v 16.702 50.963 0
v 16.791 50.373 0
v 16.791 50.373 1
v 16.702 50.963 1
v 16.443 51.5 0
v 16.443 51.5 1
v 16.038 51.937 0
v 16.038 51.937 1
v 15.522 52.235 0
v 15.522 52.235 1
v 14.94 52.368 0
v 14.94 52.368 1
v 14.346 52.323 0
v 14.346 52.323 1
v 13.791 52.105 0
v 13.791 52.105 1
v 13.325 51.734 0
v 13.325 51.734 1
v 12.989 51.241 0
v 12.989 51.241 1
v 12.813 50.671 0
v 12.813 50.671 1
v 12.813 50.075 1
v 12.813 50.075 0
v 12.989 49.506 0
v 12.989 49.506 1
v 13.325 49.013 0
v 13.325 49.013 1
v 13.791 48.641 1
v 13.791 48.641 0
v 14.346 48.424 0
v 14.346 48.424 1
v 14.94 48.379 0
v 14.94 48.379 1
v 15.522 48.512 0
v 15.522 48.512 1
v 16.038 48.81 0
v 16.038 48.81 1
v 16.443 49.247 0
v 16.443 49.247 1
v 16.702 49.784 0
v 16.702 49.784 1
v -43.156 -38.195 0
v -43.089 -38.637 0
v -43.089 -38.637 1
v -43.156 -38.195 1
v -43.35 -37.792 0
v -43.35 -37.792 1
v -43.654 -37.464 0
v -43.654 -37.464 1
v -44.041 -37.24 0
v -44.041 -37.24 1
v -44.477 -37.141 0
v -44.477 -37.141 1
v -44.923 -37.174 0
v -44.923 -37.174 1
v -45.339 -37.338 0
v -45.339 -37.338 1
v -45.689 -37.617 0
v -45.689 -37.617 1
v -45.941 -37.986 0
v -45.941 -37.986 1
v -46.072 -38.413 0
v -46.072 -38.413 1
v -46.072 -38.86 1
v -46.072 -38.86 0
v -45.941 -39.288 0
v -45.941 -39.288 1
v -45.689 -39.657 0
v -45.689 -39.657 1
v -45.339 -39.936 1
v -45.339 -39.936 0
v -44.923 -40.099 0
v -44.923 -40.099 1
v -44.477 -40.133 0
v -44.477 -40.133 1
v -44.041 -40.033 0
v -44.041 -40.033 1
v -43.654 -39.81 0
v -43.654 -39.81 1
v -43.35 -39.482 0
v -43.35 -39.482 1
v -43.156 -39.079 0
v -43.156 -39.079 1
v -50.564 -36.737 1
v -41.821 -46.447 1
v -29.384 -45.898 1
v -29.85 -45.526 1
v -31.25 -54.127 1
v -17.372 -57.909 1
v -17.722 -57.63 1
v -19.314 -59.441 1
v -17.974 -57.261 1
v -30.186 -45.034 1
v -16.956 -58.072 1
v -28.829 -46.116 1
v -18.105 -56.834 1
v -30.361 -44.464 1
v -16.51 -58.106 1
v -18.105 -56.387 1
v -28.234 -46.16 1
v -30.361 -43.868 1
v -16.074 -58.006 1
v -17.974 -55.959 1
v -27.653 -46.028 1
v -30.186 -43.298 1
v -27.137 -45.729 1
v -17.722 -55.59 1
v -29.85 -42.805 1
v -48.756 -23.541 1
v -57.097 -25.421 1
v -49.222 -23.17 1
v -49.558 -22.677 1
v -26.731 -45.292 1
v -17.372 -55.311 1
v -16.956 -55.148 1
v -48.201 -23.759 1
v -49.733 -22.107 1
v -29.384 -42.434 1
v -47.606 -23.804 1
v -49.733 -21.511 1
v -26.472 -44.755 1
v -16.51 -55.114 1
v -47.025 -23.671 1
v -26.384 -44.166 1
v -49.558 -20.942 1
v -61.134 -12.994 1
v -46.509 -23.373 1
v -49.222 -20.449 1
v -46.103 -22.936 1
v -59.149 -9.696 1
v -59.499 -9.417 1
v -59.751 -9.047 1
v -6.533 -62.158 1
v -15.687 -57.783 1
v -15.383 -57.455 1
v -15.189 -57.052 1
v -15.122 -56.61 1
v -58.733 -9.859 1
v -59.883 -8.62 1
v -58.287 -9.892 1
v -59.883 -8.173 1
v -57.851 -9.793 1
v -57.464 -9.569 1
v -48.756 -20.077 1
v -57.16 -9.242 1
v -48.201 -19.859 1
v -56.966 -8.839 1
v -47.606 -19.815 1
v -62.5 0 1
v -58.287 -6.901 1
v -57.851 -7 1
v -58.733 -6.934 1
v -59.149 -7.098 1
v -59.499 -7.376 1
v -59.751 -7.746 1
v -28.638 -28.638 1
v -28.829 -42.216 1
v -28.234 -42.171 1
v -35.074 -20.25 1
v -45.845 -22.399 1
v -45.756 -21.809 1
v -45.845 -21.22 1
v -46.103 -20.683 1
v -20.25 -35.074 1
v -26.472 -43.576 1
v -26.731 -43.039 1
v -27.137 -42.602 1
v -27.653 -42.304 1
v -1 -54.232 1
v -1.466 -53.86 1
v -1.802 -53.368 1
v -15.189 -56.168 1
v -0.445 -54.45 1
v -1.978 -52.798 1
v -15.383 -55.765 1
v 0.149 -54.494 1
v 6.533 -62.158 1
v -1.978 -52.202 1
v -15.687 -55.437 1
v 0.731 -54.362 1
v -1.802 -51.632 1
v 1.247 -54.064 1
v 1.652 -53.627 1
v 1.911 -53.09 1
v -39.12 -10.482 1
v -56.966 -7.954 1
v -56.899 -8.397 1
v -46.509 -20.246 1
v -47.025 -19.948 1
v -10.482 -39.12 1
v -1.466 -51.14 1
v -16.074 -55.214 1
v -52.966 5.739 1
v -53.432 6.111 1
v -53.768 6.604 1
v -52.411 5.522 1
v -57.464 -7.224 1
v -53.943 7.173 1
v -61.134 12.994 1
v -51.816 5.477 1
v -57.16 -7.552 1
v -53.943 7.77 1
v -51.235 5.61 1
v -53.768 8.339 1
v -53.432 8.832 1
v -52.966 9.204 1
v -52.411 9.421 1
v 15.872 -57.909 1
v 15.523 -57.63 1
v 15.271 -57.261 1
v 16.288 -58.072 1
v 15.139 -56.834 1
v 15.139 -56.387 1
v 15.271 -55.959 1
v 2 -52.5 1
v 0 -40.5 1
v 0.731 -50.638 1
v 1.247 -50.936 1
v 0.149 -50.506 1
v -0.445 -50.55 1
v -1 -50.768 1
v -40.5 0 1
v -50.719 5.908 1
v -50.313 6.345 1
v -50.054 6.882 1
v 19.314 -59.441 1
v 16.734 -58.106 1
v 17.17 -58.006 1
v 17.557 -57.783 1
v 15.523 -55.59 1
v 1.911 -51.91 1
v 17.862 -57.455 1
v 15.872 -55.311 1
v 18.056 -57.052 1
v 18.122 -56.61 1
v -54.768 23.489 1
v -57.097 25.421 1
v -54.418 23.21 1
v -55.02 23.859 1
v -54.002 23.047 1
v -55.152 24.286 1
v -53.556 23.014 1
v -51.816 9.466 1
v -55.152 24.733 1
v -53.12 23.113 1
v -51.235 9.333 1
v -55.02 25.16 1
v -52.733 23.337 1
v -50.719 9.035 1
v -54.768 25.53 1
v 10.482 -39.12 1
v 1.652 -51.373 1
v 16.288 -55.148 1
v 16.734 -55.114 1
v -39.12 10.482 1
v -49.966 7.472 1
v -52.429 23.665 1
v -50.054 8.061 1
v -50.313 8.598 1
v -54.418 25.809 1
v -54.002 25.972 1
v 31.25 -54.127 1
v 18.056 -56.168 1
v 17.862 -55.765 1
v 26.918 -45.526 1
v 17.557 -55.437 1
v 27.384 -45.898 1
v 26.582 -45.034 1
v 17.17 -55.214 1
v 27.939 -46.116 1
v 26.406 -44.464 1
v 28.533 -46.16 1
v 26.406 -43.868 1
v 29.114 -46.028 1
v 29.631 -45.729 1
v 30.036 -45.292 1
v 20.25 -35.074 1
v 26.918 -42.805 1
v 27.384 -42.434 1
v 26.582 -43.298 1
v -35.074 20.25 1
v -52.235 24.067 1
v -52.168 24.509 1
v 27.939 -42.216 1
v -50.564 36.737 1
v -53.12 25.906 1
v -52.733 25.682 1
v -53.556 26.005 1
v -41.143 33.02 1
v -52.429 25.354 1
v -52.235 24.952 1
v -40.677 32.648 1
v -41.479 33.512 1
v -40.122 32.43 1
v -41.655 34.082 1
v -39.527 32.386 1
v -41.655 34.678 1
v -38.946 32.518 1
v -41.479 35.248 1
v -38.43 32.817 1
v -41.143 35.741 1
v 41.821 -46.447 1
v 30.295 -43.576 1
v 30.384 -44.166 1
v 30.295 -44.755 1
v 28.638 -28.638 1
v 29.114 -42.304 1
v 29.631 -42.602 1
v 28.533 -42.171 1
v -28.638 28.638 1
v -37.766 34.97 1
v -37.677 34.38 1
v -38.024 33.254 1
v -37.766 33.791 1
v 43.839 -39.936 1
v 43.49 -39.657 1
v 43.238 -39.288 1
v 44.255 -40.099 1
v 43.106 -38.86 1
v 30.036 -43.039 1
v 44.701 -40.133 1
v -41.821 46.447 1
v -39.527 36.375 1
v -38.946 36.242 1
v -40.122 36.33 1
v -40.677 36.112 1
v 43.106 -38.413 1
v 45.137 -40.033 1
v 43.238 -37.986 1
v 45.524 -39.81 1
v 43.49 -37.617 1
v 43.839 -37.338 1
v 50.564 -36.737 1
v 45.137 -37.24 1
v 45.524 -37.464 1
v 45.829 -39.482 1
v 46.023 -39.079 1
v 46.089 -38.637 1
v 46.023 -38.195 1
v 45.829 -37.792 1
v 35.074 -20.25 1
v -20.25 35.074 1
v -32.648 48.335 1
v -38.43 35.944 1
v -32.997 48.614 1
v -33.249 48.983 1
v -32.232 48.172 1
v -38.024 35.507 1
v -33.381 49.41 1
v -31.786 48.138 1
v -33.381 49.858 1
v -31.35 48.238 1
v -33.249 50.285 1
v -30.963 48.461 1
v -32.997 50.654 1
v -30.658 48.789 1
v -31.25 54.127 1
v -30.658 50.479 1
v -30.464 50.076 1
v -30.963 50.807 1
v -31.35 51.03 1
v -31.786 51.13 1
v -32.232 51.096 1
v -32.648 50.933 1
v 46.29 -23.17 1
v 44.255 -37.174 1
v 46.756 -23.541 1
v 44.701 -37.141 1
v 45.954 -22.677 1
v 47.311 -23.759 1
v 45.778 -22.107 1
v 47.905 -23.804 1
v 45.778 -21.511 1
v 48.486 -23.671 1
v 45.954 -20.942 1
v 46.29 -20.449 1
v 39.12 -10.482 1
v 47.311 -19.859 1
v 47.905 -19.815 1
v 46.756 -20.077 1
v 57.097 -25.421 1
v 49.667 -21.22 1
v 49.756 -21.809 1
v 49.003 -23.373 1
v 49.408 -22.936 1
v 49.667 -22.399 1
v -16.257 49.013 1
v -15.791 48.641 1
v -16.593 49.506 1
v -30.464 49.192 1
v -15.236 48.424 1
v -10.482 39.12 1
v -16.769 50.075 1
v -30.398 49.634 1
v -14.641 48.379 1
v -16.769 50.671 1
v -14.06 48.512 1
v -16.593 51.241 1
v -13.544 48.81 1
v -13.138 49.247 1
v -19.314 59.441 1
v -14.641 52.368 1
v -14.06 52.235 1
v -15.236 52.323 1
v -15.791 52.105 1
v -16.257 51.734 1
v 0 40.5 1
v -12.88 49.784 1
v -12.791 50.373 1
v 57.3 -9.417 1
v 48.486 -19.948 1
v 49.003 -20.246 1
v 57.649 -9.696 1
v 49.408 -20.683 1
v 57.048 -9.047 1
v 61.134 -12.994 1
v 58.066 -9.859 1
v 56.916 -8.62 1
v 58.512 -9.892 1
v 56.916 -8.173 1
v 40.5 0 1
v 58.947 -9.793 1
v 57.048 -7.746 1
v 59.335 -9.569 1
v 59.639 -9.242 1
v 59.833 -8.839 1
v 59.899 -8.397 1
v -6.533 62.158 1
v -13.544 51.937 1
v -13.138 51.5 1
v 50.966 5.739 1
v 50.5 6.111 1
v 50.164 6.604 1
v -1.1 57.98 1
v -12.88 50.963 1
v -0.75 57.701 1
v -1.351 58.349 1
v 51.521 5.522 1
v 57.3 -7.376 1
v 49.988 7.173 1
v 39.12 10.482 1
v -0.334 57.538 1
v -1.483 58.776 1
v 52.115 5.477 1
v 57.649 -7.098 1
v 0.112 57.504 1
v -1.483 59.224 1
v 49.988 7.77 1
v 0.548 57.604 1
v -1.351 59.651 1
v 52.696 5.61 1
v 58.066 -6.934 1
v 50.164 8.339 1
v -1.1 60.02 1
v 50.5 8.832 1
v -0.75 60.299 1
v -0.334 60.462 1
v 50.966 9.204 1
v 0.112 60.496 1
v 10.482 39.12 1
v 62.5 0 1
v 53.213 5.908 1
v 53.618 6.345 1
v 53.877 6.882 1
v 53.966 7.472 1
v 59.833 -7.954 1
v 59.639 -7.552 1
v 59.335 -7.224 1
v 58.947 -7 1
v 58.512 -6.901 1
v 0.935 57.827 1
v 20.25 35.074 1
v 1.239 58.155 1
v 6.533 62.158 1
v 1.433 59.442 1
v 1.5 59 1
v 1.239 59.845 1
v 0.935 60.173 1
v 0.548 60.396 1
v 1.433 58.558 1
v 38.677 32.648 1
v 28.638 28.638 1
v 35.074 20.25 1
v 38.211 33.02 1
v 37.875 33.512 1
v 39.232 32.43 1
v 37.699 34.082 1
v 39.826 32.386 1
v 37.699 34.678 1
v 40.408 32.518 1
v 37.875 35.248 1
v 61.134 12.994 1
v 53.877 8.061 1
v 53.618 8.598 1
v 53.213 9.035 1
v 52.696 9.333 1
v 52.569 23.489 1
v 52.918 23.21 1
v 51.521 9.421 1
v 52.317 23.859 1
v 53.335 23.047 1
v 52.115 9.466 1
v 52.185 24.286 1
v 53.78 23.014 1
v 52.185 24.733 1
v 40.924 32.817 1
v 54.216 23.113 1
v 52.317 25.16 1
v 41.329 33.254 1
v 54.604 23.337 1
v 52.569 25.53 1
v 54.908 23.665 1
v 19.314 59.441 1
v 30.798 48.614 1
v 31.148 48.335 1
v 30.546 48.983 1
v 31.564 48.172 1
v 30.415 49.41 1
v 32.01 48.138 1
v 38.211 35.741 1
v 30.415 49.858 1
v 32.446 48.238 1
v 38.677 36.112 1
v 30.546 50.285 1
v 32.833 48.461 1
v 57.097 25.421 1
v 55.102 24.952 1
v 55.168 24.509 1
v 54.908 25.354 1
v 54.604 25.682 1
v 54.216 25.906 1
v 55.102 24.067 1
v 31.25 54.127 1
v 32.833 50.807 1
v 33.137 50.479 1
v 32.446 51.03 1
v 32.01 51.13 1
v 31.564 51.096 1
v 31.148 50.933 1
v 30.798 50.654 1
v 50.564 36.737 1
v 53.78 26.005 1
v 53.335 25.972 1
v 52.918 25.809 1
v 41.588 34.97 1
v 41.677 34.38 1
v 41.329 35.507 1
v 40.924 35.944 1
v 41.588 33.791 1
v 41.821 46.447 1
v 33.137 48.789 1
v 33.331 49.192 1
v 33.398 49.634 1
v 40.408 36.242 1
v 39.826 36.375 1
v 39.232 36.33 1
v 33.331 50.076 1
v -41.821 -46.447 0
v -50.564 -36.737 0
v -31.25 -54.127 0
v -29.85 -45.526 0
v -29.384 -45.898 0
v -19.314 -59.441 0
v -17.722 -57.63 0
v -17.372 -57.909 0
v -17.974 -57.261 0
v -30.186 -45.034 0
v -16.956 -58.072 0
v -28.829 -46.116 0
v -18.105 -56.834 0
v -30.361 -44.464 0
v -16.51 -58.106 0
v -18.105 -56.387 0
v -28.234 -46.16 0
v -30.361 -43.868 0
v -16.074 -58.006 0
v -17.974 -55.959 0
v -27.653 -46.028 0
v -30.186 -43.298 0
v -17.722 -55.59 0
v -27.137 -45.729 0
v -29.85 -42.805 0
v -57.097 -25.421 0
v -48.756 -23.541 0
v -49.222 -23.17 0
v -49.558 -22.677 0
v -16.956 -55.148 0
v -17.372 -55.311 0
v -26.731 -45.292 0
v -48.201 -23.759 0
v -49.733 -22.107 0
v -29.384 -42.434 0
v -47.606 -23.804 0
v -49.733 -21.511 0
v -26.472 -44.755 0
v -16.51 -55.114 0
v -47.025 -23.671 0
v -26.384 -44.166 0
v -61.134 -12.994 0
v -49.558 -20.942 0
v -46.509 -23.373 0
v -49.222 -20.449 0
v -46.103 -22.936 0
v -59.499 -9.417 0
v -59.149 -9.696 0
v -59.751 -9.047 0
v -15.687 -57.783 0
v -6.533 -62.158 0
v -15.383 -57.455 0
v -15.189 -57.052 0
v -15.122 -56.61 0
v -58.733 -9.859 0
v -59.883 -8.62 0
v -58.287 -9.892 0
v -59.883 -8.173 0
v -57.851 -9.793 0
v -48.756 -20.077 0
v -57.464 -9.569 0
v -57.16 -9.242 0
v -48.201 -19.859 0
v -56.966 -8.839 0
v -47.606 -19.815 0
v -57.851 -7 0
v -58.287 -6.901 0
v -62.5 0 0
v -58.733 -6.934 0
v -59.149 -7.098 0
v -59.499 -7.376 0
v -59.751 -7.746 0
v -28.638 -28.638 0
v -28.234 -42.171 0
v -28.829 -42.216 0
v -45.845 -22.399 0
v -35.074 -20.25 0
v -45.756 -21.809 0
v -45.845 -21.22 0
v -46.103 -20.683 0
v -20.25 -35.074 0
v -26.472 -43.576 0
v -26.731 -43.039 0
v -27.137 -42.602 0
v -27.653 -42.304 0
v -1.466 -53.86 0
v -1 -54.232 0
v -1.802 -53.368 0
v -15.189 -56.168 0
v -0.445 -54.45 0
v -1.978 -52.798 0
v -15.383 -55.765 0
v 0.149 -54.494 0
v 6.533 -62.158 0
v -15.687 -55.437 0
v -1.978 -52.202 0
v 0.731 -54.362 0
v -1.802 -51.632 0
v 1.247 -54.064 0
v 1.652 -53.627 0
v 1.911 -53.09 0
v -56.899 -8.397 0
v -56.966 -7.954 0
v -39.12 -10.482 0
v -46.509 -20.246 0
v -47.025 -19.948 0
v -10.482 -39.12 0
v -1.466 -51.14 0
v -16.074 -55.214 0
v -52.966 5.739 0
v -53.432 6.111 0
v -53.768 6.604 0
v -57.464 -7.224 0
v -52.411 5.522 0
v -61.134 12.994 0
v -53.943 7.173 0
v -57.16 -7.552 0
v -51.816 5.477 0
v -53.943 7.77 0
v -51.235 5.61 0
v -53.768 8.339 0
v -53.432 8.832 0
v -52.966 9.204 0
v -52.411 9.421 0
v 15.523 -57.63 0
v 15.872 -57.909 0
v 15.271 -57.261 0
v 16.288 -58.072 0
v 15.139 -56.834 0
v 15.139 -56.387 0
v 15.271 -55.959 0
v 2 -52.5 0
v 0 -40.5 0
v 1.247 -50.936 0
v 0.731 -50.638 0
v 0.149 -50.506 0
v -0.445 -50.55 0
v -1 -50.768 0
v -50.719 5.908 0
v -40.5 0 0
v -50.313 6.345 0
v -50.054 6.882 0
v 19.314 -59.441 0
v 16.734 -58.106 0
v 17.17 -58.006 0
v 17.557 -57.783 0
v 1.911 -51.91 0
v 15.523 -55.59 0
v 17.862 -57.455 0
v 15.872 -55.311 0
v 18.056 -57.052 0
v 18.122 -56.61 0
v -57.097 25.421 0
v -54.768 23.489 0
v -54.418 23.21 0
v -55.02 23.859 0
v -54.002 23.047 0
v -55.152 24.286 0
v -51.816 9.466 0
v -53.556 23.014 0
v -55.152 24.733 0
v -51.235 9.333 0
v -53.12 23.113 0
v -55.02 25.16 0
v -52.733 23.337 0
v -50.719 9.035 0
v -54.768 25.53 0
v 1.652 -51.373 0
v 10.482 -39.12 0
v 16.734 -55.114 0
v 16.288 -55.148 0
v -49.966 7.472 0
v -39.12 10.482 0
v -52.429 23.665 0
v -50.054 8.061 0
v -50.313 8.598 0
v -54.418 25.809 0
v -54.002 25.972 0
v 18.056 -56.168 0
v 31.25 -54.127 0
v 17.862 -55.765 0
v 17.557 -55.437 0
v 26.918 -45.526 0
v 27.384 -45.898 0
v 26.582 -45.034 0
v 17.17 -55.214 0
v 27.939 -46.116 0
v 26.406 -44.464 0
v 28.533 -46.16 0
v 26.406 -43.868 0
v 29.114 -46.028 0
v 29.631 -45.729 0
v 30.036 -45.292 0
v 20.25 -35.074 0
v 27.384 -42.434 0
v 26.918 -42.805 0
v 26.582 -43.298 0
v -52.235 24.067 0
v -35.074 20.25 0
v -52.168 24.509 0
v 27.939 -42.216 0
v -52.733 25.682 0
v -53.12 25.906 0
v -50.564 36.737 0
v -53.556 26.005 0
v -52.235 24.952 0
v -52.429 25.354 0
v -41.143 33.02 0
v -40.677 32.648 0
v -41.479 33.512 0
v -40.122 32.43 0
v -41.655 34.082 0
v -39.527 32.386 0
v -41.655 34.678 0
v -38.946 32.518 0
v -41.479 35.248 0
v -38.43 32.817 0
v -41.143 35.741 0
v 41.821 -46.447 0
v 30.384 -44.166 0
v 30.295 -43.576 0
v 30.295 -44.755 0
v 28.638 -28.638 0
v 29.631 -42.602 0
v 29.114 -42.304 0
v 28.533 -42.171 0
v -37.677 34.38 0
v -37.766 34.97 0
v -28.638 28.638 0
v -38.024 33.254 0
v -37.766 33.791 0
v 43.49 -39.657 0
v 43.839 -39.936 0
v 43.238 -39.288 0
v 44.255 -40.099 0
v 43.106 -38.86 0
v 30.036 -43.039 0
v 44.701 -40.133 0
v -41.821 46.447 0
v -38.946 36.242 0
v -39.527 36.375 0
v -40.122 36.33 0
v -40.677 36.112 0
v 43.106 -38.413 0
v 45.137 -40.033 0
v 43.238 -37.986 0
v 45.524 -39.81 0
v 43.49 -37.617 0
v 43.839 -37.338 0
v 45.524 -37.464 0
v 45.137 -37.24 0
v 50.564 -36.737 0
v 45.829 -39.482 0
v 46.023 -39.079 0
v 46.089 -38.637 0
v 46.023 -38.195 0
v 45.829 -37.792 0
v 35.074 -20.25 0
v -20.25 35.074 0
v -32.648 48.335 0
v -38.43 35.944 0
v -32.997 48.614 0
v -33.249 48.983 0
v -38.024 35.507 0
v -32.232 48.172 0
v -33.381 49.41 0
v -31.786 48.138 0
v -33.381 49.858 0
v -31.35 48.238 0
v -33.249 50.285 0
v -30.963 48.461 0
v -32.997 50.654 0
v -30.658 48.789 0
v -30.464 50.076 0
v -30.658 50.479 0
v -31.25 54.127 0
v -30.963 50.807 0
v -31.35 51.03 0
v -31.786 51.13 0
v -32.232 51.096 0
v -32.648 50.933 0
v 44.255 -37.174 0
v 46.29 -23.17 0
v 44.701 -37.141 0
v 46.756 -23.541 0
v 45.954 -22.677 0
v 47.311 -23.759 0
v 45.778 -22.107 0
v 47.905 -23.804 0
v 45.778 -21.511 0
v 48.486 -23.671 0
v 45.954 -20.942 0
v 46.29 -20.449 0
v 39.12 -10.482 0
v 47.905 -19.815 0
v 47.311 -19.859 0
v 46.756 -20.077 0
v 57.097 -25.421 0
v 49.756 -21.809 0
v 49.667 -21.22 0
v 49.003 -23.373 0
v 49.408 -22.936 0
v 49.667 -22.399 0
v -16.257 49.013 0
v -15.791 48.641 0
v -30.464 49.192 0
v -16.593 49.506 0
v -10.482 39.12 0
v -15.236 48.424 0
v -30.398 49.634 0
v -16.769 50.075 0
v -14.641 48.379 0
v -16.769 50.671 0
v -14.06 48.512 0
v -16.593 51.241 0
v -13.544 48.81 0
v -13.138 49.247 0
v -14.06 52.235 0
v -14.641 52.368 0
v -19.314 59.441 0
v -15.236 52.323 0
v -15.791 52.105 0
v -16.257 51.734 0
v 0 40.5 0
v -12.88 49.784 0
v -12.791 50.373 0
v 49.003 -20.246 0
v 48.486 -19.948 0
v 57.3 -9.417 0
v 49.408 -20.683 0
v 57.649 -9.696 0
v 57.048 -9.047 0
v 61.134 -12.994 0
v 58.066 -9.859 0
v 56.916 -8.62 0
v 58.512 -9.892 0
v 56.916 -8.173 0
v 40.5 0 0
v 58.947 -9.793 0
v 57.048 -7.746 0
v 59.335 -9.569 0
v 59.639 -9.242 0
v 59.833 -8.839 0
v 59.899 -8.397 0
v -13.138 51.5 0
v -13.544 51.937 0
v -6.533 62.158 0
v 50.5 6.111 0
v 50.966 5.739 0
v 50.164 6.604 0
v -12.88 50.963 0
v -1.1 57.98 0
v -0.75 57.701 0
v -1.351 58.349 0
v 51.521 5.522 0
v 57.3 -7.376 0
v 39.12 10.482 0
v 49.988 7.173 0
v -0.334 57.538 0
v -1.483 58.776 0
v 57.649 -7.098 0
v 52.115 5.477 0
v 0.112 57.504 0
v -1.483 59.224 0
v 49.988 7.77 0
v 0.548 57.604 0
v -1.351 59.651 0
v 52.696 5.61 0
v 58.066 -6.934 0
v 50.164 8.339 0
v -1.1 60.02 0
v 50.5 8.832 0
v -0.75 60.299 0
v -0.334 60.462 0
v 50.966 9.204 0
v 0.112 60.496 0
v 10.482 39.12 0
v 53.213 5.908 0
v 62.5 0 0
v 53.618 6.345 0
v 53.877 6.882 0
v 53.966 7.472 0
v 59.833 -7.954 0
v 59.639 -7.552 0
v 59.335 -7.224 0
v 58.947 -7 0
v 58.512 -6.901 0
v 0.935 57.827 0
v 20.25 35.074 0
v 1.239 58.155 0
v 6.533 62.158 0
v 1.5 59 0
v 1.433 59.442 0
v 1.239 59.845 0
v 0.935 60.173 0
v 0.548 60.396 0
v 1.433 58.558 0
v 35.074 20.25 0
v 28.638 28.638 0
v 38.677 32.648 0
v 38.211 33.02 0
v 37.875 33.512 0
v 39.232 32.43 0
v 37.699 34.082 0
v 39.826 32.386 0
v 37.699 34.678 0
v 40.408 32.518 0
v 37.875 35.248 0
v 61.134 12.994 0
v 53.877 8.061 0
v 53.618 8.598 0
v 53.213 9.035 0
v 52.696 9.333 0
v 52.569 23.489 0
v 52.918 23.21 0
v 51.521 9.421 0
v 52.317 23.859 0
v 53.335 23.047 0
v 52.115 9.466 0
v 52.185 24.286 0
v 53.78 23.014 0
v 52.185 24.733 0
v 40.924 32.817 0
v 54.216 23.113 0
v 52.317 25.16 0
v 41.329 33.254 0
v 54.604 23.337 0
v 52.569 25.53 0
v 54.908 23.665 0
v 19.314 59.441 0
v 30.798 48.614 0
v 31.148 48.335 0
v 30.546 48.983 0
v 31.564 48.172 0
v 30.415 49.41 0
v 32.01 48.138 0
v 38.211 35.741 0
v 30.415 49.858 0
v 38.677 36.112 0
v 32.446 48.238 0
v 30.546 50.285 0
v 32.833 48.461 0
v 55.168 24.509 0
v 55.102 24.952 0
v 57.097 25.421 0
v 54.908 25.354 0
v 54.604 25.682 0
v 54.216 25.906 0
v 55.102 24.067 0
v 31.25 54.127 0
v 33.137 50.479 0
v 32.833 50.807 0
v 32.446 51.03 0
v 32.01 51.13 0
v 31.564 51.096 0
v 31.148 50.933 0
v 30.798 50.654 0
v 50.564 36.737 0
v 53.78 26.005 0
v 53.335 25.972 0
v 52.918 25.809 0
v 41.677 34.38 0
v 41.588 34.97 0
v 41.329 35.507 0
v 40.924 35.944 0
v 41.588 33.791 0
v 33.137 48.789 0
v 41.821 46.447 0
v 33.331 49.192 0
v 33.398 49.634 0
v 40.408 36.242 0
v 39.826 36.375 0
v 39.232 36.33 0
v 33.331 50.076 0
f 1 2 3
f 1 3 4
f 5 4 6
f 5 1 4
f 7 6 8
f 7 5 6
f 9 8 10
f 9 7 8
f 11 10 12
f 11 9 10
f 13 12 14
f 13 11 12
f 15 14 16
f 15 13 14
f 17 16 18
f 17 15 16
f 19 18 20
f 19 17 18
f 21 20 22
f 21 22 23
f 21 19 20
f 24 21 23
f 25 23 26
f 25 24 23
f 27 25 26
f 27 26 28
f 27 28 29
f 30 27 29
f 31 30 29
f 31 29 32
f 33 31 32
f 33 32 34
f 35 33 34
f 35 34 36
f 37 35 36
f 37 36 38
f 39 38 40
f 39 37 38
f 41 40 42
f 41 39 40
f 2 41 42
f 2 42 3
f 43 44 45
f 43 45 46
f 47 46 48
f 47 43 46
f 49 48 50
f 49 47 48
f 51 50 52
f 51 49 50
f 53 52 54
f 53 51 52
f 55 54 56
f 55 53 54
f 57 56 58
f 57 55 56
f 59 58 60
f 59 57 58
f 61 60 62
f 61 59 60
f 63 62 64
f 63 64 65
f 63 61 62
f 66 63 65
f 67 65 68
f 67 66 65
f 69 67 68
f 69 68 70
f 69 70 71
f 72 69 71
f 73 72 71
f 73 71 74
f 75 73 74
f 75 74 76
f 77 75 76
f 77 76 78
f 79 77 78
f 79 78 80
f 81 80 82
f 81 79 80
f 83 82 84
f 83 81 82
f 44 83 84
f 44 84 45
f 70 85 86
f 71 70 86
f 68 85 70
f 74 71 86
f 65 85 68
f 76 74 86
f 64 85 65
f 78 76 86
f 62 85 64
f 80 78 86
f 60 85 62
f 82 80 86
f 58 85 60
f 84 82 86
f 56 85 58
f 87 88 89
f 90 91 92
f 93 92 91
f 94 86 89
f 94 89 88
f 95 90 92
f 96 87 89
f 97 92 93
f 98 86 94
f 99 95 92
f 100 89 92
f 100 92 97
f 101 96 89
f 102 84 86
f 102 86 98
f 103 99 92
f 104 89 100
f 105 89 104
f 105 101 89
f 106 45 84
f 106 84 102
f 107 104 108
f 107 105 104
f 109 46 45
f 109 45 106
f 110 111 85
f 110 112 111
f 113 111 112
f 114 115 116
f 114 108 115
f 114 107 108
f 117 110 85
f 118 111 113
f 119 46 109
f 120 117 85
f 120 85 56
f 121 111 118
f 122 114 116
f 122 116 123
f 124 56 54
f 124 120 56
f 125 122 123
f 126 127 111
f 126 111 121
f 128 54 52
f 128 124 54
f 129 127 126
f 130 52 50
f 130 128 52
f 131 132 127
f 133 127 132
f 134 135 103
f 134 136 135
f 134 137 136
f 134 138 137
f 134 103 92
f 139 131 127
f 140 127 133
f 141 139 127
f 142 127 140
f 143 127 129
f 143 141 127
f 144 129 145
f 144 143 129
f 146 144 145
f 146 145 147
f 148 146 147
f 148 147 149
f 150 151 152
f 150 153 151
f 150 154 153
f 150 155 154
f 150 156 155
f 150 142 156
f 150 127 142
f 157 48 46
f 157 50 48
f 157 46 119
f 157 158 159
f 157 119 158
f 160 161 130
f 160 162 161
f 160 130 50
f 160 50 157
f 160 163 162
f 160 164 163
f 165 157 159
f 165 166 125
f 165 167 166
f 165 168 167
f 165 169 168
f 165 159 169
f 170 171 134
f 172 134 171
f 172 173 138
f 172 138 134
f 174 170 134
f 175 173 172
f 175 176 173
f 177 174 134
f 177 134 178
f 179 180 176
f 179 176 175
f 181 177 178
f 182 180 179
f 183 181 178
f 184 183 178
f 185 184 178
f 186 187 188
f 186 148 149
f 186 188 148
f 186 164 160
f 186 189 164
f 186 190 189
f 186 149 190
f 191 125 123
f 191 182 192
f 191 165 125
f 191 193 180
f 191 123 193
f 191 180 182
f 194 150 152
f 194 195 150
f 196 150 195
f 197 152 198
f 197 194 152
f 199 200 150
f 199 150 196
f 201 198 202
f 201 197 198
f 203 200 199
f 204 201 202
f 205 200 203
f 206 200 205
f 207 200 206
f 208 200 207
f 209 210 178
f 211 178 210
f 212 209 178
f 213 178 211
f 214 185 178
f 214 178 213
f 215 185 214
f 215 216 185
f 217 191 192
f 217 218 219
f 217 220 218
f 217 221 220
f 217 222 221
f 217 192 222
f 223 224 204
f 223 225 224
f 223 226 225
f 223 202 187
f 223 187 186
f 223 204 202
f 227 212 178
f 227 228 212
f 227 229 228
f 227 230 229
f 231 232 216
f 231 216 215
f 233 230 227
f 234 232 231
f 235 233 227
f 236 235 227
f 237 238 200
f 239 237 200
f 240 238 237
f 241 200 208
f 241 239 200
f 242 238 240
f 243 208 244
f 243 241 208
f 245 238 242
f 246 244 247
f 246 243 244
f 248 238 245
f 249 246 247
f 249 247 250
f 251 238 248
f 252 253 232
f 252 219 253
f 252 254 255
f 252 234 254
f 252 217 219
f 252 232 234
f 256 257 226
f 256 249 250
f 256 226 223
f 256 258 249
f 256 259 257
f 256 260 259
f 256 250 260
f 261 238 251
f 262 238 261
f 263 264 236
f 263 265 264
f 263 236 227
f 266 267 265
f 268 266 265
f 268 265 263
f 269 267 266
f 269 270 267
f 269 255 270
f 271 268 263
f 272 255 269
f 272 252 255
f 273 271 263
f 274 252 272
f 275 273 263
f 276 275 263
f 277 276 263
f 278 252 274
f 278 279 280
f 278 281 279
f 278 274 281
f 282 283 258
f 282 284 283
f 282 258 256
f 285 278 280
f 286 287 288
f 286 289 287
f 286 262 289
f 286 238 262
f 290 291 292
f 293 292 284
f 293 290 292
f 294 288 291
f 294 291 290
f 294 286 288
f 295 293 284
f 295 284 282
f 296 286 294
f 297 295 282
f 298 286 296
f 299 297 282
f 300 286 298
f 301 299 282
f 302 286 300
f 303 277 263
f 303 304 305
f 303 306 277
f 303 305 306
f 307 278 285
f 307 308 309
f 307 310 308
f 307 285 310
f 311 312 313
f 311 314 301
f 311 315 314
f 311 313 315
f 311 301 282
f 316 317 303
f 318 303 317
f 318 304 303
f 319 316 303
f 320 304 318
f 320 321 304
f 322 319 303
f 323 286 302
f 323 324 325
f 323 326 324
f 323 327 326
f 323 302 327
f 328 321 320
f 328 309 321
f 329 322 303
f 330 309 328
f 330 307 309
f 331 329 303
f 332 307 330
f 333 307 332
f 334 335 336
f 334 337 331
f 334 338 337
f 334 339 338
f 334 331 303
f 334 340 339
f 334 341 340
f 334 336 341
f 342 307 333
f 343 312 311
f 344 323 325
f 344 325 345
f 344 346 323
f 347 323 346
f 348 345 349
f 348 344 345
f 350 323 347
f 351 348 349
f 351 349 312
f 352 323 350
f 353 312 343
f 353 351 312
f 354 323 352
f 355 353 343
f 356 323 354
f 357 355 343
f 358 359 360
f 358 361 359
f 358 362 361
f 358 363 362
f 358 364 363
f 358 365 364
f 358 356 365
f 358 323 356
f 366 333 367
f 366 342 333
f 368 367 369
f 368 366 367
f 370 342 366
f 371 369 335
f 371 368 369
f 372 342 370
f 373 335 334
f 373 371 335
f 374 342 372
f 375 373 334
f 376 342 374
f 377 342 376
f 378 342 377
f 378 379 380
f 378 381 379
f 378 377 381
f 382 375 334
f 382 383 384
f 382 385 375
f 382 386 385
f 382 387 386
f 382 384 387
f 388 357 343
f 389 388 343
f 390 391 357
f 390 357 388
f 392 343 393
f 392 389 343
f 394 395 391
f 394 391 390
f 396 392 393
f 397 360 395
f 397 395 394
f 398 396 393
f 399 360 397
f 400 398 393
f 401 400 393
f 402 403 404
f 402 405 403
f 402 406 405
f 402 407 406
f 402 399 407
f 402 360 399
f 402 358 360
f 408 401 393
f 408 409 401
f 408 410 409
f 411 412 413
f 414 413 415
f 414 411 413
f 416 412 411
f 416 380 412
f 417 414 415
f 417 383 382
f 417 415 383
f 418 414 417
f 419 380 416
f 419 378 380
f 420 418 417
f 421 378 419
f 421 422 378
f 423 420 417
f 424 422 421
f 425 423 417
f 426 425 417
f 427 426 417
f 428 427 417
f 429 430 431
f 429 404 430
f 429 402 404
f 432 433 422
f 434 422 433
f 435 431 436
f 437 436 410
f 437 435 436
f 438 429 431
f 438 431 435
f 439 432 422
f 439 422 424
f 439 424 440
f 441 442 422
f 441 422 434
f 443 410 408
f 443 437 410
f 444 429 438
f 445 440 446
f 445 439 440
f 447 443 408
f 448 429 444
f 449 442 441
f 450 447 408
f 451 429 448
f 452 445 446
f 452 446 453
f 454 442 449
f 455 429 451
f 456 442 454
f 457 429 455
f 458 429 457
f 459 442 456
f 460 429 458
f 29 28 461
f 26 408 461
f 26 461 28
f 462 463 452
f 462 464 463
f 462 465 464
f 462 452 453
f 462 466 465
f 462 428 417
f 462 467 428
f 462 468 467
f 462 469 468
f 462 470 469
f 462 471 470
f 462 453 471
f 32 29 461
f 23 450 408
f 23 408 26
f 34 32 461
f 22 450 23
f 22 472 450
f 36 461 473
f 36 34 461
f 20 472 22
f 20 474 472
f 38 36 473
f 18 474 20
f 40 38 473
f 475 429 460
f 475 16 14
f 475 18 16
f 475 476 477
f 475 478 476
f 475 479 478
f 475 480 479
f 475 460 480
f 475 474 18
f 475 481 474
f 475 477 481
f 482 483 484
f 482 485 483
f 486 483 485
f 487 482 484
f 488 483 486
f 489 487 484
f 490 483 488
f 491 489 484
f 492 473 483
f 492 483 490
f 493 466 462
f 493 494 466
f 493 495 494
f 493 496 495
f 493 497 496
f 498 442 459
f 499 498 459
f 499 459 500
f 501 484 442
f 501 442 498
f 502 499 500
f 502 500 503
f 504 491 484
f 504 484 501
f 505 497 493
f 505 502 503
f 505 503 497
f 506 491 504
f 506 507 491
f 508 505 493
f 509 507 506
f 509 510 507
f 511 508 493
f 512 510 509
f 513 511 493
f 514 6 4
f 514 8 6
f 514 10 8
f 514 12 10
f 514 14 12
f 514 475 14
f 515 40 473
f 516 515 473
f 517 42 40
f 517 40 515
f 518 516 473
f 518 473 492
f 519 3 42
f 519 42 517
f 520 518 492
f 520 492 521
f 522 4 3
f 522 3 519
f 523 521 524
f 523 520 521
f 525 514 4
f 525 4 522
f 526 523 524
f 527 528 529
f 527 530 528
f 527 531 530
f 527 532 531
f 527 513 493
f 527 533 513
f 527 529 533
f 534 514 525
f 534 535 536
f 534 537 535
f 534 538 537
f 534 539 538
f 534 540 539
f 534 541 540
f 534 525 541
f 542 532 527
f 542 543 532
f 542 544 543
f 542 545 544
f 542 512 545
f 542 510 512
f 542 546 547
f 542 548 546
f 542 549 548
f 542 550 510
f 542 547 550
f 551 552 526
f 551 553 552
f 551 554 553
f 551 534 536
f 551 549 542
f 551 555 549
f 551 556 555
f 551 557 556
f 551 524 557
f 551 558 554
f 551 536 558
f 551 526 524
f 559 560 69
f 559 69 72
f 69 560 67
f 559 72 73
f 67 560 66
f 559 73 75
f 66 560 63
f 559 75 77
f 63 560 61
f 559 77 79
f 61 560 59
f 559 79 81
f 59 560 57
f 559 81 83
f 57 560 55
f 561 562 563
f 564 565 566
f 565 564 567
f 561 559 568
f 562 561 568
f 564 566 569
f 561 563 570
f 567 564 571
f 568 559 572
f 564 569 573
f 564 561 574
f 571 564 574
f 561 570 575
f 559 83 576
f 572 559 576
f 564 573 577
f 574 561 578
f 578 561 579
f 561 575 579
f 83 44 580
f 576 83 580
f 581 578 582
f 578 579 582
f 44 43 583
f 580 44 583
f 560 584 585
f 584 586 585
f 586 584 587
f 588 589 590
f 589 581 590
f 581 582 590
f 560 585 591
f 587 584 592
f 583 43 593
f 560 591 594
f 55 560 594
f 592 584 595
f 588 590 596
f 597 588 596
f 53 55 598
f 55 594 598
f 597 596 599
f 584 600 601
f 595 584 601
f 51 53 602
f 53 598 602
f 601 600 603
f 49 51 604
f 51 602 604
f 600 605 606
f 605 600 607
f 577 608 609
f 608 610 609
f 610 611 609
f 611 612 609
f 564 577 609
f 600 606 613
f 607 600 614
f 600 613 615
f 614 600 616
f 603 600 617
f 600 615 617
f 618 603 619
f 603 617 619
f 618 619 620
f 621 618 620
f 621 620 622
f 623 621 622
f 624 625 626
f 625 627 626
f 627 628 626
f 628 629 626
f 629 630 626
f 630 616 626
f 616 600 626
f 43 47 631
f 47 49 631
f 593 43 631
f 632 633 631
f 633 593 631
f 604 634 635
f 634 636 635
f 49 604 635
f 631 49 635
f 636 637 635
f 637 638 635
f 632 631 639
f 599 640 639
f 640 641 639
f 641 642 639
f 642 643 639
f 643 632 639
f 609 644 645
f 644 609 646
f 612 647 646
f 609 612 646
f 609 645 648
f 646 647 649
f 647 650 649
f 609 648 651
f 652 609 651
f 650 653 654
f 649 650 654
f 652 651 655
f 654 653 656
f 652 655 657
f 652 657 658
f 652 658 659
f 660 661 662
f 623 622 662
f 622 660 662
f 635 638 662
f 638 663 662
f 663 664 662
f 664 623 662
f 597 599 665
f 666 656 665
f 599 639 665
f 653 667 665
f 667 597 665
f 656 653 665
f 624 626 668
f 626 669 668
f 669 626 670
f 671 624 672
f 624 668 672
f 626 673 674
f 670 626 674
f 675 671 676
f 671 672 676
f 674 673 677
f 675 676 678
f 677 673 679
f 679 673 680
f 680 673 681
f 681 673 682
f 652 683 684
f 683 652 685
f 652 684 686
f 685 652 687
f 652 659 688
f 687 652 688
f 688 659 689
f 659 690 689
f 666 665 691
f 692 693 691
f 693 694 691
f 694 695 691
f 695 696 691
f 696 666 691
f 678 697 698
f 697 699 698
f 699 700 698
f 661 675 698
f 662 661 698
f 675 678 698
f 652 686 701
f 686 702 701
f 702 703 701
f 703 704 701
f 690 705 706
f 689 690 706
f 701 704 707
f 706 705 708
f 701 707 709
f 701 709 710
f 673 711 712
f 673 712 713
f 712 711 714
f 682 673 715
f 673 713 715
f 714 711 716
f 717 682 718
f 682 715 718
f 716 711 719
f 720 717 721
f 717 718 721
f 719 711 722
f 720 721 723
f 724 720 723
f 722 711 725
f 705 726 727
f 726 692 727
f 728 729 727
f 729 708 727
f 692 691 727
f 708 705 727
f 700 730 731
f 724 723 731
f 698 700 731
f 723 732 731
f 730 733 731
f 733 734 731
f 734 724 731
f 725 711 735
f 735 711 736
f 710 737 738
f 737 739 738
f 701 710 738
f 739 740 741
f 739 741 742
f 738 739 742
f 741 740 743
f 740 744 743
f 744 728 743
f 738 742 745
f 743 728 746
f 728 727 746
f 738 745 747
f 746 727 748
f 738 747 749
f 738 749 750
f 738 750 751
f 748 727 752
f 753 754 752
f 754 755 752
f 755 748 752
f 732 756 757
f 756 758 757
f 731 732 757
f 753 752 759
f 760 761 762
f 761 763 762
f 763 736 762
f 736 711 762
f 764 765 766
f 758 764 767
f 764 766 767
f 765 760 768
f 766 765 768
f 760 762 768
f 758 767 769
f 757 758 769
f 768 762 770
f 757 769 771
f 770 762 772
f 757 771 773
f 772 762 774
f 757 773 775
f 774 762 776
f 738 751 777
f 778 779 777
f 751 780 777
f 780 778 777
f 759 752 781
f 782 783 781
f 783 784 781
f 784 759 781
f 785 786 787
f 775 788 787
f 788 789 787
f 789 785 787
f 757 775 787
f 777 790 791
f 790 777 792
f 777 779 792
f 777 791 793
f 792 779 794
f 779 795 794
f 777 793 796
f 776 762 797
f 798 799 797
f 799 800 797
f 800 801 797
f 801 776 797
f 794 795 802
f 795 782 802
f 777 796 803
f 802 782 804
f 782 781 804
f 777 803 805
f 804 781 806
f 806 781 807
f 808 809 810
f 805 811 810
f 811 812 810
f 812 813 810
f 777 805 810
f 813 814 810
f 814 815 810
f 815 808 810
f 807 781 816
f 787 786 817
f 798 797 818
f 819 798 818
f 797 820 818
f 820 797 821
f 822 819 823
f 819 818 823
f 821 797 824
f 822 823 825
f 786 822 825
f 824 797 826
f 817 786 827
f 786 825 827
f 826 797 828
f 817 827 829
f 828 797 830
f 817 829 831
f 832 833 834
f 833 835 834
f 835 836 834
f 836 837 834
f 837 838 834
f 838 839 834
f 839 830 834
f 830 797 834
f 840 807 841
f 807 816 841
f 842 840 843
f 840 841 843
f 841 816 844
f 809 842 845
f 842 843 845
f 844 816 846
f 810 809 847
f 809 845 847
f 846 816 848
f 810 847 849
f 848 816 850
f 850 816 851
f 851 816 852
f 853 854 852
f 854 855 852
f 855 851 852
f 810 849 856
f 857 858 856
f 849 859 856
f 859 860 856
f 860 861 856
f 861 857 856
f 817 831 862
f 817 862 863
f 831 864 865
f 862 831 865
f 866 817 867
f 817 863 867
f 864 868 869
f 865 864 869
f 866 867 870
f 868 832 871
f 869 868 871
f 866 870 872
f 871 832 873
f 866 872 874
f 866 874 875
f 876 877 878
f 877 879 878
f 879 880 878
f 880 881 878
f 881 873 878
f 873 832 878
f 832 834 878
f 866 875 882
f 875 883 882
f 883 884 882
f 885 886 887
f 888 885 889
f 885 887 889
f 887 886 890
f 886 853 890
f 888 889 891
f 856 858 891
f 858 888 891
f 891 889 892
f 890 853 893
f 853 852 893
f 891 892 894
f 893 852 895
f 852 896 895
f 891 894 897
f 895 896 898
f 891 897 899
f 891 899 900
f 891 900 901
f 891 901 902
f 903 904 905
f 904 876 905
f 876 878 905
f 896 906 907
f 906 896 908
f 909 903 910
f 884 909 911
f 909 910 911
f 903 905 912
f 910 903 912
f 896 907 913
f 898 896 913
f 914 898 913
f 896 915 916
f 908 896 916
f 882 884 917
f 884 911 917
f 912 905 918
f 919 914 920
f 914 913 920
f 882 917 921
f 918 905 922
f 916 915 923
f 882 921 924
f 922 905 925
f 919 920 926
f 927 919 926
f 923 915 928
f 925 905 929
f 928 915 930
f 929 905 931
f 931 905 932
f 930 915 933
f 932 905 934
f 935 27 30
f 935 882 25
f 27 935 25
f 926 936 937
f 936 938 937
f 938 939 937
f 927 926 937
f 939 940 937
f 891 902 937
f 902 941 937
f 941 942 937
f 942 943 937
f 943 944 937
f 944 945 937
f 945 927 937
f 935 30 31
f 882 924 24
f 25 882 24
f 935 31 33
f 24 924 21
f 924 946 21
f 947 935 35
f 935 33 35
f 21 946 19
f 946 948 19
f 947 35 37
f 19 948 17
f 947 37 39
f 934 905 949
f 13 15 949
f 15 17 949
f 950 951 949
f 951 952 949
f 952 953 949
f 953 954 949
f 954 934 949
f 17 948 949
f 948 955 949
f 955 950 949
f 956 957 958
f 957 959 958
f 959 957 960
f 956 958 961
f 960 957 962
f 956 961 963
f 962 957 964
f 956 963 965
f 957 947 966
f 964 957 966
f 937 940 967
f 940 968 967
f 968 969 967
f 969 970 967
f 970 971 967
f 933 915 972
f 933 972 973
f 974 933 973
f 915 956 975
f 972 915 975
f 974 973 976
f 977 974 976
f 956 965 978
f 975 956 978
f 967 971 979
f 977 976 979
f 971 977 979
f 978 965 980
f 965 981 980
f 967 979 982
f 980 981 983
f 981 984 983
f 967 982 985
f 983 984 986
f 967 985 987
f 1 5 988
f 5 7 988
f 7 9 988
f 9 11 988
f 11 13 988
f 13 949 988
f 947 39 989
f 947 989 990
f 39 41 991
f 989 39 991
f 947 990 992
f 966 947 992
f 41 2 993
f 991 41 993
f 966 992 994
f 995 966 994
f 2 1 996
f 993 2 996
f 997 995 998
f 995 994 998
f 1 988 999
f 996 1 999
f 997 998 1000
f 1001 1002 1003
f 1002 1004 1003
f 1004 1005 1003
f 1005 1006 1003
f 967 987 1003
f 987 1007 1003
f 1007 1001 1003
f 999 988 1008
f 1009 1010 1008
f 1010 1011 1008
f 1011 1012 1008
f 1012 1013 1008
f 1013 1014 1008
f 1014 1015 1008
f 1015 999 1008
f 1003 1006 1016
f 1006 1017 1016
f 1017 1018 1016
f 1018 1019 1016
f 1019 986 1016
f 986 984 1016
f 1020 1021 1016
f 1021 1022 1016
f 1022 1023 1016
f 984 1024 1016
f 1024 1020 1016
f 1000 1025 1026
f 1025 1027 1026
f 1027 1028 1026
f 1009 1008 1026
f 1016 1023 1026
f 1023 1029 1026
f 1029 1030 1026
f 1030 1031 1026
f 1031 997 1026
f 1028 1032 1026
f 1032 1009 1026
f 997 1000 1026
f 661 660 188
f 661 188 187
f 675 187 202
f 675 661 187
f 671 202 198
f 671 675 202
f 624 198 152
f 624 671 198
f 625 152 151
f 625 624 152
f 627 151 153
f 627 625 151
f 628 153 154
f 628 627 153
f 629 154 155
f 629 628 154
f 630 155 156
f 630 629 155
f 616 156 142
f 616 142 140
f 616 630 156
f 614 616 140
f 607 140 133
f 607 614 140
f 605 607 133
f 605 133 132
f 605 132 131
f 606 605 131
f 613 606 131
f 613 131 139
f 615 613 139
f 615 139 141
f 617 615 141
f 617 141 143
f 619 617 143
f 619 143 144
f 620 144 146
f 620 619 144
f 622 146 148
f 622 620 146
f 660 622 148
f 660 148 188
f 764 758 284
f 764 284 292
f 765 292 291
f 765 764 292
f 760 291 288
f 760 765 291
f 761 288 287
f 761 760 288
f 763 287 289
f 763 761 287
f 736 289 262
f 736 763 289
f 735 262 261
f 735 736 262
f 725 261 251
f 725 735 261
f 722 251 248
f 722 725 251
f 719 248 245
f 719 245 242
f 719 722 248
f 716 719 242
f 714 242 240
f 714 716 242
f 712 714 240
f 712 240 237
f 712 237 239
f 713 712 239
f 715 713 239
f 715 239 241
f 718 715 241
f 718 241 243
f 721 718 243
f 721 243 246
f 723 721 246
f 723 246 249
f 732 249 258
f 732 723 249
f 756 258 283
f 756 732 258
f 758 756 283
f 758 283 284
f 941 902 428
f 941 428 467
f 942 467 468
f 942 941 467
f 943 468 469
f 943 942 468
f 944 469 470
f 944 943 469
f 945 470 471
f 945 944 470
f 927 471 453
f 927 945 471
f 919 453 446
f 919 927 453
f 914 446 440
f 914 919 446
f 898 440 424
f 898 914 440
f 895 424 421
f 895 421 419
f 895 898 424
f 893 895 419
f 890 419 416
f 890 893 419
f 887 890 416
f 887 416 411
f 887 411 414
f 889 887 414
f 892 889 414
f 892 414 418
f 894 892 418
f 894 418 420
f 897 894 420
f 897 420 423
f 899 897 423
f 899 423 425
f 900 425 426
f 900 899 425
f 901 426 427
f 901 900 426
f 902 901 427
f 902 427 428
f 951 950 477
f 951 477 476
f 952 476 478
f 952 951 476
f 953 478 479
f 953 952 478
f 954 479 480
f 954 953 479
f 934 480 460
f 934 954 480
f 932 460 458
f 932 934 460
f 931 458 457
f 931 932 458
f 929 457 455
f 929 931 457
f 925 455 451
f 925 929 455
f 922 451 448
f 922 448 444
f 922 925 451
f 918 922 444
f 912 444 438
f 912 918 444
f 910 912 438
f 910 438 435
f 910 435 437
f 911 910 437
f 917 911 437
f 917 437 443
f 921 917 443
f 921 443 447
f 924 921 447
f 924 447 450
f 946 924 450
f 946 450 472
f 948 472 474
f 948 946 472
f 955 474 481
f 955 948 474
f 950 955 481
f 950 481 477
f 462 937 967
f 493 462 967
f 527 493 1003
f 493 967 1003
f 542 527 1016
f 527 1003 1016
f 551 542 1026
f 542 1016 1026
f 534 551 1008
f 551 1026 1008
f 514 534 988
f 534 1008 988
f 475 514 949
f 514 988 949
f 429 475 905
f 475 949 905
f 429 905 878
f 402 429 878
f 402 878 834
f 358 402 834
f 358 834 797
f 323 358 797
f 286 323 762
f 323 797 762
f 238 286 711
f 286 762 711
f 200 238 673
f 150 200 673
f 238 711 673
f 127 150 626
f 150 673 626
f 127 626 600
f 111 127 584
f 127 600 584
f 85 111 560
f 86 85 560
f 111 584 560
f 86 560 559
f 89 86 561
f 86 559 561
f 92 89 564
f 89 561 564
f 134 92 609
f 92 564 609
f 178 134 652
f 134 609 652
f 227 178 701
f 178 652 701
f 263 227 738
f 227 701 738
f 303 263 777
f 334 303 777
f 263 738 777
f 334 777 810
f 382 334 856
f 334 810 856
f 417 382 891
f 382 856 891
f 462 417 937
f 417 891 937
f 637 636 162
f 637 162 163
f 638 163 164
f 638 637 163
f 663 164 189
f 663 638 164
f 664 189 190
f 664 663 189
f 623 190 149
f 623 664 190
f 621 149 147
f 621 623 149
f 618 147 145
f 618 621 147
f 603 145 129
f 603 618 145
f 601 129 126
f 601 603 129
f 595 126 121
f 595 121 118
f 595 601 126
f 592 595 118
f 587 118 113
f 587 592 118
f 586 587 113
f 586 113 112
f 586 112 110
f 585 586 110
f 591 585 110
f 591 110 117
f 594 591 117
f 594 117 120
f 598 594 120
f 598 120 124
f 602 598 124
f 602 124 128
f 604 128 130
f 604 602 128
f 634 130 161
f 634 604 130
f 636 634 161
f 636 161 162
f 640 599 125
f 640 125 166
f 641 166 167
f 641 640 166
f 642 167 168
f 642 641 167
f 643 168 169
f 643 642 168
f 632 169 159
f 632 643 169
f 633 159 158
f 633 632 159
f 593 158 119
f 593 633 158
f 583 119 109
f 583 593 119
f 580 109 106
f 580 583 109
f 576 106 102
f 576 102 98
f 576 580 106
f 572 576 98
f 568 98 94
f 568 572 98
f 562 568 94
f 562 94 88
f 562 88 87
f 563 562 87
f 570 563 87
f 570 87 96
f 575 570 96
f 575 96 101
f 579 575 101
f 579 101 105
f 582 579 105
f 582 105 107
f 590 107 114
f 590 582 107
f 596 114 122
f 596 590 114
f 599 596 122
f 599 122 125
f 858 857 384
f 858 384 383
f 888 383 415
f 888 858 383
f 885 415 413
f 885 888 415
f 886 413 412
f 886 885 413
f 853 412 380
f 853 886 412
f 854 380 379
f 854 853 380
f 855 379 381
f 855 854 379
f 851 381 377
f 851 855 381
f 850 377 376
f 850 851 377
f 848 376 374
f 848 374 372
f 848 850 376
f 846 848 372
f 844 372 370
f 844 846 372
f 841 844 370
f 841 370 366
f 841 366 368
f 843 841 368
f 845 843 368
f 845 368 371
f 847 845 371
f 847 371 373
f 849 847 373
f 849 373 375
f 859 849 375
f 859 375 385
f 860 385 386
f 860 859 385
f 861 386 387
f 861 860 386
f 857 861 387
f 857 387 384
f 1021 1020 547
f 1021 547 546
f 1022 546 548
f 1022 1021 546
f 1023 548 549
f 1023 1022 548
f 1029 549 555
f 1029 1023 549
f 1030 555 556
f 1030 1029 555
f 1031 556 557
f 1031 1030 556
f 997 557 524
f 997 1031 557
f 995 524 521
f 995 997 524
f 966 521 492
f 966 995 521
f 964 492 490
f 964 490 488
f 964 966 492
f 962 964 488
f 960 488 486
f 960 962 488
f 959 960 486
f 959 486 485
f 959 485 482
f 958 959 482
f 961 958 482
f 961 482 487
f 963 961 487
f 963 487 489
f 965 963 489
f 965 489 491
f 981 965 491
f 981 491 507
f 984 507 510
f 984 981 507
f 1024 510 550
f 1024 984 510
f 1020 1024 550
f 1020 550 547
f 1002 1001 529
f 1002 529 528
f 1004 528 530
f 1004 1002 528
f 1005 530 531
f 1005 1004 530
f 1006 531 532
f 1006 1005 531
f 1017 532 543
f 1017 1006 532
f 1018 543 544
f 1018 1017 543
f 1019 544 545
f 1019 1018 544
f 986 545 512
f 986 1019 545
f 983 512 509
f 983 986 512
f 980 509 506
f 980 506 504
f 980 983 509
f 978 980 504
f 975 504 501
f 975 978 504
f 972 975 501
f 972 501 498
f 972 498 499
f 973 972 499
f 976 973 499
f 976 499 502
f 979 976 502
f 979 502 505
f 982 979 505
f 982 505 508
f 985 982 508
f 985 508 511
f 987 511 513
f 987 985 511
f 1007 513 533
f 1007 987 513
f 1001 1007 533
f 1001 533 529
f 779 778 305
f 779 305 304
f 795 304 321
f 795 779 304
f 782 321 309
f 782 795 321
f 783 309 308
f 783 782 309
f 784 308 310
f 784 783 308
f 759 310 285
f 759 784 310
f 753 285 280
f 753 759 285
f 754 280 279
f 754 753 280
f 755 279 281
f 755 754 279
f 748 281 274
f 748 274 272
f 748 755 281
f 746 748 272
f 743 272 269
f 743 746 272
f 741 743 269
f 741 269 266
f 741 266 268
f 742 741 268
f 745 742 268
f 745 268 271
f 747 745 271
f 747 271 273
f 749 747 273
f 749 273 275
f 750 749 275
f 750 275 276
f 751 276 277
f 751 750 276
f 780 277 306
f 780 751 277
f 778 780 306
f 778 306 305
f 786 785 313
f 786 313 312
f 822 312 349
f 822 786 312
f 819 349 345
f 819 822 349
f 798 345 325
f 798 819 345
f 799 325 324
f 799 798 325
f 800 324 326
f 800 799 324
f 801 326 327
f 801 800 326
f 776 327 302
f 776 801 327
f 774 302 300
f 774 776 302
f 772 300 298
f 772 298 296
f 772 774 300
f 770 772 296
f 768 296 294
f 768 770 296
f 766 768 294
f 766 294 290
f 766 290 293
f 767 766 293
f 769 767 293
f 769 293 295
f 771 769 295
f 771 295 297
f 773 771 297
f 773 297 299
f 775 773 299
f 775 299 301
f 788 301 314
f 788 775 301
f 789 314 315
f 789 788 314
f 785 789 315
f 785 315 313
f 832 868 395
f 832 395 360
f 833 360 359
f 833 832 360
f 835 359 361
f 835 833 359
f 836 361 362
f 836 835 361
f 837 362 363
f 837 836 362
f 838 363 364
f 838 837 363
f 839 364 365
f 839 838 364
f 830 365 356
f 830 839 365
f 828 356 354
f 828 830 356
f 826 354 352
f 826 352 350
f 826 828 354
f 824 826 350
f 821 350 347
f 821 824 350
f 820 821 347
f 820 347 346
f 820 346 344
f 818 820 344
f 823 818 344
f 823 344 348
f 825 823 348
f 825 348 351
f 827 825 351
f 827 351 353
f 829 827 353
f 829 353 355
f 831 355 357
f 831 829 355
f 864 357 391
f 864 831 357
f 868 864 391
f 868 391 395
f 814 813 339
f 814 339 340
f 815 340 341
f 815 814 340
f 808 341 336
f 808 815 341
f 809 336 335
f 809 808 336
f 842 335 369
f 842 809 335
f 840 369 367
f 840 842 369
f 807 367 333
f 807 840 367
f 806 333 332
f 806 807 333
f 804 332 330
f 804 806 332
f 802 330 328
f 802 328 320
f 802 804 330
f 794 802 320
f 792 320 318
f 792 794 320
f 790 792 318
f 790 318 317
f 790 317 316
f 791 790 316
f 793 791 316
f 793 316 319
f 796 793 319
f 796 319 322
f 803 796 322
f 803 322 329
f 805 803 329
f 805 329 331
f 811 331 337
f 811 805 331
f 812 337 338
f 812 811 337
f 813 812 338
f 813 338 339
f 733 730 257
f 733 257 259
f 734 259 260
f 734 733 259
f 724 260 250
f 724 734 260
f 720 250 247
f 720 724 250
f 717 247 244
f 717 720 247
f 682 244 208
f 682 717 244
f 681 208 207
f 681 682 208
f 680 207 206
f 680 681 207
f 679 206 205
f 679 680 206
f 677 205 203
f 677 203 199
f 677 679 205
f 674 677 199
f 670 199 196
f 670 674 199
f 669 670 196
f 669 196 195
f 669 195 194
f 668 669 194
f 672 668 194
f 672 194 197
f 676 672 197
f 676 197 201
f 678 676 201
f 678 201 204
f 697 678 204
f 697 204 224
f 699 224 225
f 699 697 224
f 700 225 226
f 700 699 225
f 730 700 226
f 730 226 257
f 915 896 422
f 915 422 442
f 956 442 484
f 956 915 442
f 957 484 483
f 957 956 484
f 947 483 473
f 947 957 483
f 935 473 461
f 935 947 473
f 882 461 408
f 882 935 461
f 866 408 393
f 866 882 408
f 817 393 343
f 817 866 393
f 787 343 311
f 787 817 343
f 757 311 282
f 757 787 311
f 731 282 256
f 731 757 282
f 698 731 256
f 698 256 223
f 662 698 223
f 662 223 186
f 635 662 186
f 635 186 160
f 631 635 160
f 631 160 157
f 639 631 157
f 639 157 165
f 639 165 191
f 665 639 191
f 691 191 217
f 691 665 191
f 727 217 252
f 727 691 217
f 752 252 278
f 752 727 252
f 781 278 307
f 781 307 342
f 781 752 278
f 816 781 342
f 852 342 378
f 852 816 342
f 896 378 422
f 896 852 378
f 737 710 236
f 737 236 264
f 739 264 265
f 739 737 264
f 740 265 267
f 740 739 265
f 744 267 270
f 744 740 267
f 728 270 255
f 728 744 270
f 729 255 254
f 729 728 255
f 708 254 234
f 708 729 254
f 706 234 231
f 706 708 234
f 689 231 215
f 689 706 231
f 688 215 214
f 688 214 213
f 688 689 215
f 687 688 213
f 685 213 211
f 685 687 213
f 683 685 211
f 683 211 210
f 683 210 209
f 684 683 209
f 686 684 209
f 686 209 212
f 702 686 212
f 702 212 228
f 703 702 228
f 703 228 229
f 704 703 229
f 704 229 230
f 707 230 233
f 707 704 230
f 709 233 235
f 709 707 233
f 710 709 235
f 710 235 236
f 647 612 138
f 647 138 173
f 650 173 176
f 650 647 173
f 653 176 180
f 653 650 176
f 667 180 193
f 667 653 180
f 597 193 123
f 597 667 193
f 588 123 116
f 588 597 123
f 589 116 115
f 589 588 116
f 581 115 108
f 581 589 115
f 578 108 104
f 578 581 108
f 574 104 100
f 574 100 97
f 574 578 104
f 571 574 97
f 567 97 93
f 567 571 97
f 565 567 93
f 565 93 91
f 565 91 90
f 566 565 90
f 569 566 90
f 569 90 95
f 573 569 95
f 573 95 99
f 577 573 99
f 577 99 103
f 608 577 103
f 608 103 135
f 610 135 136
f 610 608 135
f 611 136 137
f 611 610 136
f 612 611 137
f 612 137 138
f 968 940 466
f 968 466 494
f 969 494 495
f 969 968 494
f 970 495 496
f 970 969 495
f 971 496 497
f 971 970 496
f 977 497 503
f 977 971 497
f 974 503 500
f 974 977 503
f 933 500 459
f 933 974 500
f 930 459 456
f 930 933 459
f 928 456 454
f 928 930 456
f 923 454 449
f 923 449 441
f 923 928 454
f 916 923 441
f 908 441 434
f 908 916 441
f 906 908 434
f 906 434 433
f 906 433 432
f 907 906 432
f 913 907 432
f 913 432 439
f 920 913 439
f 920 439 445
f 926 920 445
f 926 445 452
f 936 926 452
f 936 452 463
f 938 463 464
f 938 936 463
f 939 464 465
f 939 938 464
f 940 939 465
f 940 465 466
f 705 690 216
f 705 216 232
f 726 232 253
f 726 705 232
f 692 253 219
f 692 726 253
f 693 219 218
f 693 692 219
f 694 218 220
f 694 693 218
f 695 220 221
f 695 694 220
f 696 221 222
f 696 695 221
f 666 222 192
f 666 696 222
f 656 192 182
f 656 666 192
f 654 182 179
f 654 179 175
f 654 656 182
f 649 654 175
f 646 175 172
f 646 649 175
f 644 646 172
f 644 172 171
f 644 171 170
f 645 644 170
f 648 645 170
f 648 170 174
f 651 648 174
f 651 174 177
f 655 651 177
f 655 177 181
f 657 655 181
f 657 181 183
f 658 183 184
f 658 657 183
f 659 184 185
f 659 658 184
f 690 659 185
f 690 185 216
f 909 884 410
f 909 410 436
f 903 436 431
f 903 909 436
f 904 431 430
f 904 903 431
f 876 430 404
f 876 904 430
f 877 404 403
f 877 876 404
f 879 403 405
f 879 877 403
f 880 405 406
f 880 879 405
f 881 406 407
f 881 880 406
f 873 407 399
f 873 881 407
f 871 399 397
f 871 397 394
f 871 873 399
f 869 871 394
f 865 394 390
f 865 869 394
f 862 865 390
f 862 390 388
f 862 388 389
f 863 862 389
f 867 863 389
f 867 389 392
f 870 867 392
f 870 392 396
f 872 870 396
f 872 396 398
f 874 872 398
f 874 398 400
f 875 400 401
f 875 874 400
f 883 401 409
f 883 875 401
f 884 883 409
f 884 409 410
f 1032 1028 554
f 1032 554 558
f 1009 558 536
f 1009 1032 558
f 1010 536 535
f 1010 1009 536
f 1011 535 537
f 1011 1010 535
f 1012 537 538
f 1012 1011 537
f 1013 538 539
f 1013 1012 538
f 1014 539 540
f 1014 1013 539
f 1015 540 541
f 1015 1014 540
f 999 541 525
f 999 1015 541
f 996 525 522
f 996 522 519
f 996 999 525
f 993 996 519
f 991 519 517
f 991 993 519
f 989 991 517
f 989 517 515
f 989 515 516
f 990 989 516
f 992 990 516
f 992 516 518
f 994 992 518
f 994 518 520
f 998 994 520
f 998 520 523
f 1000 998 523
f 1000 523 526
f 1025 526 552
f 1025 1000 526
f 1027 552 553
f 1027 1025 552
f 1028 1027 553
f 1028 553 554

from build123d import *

# Parameters (mm, degrees)
SKETCH_1_R      = 62.5
SKETCH_1_R_2    = 40.5
SKETCH_1_R_3    = 2
SKETCH_1_R_4    = 1.5
EXTRUDE_1_DEPTH = 1


with BuildPart() as part:
    # 草图1 → 凸台-拉伸1 (new body)
    with BuildSketch(Plane.XY):
        Circle(SKETCH_1_R)
        Circle(SKETCH_1_R_2, mode=Mode.SUBTRACT)
        with Locations((0, -52.5)):
            Circle(SKETCH_1_R_3, mode=Mode.SUBTRACT)
        with Locations((-28.383642916, -44.165810474)):
            Circle(SKETCH_1_R_3, mode=Mode.SUBTRACT)
        with Locations((-47.755679756, -21.809288183)):
            Circle(SKETCH_1_R_3, mode=Mode.SUBTRACT)
        with Locations((-51.965625699, 7.471529009)):
            Circle(SKETCH_1_R_3, mode=Mode.SUBTRACT)
        with Locations((-39.676852654, 34.380188532)):
            Circle(SKETCH_1_R_3, mode=Mode.SUBTRACT)
        with Locations((-14.790959234, 50.373381115)):
            Circle(SKETCH_1_R_3, mode=Mode.SUBTRACT)
        with Locations((14.790959234, 50.373381115)):
            Circle(SKETCH_1_R_3, mode=Mode.SUBTRACT)
        with Locations((39.676852654, 34.380188532)):
            Circle(SKETCH_1_R_3, mode=Mode.SUBTRACT)
        with Locations((51.965625699, 7.471529009)):
            Circle(SKETCH_1_R_3, mode=Mode.SUBTRACT)
        with Locations((47.755679756, -21.809288183)):
            Circle(SKETCH_1_R_3, mode=Mode.SUBTRACT)
        with Locations((28.383642916, -44.165810474)):
            Circle(SKETCH_1_R_3, mode=Mode.SUBTRACT)
        with Locations((-16.622220854, -56.610085443)):
            Circle(SKETCH_1_R_4, mode=Mode.SUBTRACT)
        with Locations((-44.589224887, -38.636783303)):
            Circle(SKETCH_1_R_4, mode=Mode.SUBTRACT)
        with Locations((-58.399465071, -8.396575458)):
            Circle(SKETCH_1_R_4, mode=Mode.SUBTRACT)
        with Locations((-53.668287726, 24.509485767)):
            Circle(SKETCH_1_R_4, mode=Mode.SUBTRACT)
        with Locations((-31.89780823, 49.633958437)):
            Circle(SKETCH_1_R_4, mode=Mode.SUBTRACT)
        with Locations((0, 59)):
            Circle(SKETCH_1_R_4, mode=Mode.SUBTRACT)
        with Locations((31.89780823, 49.633958437)):
            Circle(SKETCH_1_R_4, mode=Mode.SUBTRACT)
        with Locations((53.668287726, 24.509485767)):
            Circle(SKETCH_1_R_4, mode=Mode.SUBTRACT)
        with Locations((58.399465071, -8.396575458)):
            Circle(SKETCH_1_R_4, mode=Mode.SUBTRACT)
        with Locations((44.589224887, -38.636783303)):
            Circle(SKETCH_1_R_4, mode=Mode.SUBTRACT)
        with Locations((16.622220854, -56.610085443)):
            Circle(SKETCH_1_R_4, mode=Mode.SUBTRACT)
    extrude(amount=EXTRUDE_1_DEPTH)


solid = part.part
